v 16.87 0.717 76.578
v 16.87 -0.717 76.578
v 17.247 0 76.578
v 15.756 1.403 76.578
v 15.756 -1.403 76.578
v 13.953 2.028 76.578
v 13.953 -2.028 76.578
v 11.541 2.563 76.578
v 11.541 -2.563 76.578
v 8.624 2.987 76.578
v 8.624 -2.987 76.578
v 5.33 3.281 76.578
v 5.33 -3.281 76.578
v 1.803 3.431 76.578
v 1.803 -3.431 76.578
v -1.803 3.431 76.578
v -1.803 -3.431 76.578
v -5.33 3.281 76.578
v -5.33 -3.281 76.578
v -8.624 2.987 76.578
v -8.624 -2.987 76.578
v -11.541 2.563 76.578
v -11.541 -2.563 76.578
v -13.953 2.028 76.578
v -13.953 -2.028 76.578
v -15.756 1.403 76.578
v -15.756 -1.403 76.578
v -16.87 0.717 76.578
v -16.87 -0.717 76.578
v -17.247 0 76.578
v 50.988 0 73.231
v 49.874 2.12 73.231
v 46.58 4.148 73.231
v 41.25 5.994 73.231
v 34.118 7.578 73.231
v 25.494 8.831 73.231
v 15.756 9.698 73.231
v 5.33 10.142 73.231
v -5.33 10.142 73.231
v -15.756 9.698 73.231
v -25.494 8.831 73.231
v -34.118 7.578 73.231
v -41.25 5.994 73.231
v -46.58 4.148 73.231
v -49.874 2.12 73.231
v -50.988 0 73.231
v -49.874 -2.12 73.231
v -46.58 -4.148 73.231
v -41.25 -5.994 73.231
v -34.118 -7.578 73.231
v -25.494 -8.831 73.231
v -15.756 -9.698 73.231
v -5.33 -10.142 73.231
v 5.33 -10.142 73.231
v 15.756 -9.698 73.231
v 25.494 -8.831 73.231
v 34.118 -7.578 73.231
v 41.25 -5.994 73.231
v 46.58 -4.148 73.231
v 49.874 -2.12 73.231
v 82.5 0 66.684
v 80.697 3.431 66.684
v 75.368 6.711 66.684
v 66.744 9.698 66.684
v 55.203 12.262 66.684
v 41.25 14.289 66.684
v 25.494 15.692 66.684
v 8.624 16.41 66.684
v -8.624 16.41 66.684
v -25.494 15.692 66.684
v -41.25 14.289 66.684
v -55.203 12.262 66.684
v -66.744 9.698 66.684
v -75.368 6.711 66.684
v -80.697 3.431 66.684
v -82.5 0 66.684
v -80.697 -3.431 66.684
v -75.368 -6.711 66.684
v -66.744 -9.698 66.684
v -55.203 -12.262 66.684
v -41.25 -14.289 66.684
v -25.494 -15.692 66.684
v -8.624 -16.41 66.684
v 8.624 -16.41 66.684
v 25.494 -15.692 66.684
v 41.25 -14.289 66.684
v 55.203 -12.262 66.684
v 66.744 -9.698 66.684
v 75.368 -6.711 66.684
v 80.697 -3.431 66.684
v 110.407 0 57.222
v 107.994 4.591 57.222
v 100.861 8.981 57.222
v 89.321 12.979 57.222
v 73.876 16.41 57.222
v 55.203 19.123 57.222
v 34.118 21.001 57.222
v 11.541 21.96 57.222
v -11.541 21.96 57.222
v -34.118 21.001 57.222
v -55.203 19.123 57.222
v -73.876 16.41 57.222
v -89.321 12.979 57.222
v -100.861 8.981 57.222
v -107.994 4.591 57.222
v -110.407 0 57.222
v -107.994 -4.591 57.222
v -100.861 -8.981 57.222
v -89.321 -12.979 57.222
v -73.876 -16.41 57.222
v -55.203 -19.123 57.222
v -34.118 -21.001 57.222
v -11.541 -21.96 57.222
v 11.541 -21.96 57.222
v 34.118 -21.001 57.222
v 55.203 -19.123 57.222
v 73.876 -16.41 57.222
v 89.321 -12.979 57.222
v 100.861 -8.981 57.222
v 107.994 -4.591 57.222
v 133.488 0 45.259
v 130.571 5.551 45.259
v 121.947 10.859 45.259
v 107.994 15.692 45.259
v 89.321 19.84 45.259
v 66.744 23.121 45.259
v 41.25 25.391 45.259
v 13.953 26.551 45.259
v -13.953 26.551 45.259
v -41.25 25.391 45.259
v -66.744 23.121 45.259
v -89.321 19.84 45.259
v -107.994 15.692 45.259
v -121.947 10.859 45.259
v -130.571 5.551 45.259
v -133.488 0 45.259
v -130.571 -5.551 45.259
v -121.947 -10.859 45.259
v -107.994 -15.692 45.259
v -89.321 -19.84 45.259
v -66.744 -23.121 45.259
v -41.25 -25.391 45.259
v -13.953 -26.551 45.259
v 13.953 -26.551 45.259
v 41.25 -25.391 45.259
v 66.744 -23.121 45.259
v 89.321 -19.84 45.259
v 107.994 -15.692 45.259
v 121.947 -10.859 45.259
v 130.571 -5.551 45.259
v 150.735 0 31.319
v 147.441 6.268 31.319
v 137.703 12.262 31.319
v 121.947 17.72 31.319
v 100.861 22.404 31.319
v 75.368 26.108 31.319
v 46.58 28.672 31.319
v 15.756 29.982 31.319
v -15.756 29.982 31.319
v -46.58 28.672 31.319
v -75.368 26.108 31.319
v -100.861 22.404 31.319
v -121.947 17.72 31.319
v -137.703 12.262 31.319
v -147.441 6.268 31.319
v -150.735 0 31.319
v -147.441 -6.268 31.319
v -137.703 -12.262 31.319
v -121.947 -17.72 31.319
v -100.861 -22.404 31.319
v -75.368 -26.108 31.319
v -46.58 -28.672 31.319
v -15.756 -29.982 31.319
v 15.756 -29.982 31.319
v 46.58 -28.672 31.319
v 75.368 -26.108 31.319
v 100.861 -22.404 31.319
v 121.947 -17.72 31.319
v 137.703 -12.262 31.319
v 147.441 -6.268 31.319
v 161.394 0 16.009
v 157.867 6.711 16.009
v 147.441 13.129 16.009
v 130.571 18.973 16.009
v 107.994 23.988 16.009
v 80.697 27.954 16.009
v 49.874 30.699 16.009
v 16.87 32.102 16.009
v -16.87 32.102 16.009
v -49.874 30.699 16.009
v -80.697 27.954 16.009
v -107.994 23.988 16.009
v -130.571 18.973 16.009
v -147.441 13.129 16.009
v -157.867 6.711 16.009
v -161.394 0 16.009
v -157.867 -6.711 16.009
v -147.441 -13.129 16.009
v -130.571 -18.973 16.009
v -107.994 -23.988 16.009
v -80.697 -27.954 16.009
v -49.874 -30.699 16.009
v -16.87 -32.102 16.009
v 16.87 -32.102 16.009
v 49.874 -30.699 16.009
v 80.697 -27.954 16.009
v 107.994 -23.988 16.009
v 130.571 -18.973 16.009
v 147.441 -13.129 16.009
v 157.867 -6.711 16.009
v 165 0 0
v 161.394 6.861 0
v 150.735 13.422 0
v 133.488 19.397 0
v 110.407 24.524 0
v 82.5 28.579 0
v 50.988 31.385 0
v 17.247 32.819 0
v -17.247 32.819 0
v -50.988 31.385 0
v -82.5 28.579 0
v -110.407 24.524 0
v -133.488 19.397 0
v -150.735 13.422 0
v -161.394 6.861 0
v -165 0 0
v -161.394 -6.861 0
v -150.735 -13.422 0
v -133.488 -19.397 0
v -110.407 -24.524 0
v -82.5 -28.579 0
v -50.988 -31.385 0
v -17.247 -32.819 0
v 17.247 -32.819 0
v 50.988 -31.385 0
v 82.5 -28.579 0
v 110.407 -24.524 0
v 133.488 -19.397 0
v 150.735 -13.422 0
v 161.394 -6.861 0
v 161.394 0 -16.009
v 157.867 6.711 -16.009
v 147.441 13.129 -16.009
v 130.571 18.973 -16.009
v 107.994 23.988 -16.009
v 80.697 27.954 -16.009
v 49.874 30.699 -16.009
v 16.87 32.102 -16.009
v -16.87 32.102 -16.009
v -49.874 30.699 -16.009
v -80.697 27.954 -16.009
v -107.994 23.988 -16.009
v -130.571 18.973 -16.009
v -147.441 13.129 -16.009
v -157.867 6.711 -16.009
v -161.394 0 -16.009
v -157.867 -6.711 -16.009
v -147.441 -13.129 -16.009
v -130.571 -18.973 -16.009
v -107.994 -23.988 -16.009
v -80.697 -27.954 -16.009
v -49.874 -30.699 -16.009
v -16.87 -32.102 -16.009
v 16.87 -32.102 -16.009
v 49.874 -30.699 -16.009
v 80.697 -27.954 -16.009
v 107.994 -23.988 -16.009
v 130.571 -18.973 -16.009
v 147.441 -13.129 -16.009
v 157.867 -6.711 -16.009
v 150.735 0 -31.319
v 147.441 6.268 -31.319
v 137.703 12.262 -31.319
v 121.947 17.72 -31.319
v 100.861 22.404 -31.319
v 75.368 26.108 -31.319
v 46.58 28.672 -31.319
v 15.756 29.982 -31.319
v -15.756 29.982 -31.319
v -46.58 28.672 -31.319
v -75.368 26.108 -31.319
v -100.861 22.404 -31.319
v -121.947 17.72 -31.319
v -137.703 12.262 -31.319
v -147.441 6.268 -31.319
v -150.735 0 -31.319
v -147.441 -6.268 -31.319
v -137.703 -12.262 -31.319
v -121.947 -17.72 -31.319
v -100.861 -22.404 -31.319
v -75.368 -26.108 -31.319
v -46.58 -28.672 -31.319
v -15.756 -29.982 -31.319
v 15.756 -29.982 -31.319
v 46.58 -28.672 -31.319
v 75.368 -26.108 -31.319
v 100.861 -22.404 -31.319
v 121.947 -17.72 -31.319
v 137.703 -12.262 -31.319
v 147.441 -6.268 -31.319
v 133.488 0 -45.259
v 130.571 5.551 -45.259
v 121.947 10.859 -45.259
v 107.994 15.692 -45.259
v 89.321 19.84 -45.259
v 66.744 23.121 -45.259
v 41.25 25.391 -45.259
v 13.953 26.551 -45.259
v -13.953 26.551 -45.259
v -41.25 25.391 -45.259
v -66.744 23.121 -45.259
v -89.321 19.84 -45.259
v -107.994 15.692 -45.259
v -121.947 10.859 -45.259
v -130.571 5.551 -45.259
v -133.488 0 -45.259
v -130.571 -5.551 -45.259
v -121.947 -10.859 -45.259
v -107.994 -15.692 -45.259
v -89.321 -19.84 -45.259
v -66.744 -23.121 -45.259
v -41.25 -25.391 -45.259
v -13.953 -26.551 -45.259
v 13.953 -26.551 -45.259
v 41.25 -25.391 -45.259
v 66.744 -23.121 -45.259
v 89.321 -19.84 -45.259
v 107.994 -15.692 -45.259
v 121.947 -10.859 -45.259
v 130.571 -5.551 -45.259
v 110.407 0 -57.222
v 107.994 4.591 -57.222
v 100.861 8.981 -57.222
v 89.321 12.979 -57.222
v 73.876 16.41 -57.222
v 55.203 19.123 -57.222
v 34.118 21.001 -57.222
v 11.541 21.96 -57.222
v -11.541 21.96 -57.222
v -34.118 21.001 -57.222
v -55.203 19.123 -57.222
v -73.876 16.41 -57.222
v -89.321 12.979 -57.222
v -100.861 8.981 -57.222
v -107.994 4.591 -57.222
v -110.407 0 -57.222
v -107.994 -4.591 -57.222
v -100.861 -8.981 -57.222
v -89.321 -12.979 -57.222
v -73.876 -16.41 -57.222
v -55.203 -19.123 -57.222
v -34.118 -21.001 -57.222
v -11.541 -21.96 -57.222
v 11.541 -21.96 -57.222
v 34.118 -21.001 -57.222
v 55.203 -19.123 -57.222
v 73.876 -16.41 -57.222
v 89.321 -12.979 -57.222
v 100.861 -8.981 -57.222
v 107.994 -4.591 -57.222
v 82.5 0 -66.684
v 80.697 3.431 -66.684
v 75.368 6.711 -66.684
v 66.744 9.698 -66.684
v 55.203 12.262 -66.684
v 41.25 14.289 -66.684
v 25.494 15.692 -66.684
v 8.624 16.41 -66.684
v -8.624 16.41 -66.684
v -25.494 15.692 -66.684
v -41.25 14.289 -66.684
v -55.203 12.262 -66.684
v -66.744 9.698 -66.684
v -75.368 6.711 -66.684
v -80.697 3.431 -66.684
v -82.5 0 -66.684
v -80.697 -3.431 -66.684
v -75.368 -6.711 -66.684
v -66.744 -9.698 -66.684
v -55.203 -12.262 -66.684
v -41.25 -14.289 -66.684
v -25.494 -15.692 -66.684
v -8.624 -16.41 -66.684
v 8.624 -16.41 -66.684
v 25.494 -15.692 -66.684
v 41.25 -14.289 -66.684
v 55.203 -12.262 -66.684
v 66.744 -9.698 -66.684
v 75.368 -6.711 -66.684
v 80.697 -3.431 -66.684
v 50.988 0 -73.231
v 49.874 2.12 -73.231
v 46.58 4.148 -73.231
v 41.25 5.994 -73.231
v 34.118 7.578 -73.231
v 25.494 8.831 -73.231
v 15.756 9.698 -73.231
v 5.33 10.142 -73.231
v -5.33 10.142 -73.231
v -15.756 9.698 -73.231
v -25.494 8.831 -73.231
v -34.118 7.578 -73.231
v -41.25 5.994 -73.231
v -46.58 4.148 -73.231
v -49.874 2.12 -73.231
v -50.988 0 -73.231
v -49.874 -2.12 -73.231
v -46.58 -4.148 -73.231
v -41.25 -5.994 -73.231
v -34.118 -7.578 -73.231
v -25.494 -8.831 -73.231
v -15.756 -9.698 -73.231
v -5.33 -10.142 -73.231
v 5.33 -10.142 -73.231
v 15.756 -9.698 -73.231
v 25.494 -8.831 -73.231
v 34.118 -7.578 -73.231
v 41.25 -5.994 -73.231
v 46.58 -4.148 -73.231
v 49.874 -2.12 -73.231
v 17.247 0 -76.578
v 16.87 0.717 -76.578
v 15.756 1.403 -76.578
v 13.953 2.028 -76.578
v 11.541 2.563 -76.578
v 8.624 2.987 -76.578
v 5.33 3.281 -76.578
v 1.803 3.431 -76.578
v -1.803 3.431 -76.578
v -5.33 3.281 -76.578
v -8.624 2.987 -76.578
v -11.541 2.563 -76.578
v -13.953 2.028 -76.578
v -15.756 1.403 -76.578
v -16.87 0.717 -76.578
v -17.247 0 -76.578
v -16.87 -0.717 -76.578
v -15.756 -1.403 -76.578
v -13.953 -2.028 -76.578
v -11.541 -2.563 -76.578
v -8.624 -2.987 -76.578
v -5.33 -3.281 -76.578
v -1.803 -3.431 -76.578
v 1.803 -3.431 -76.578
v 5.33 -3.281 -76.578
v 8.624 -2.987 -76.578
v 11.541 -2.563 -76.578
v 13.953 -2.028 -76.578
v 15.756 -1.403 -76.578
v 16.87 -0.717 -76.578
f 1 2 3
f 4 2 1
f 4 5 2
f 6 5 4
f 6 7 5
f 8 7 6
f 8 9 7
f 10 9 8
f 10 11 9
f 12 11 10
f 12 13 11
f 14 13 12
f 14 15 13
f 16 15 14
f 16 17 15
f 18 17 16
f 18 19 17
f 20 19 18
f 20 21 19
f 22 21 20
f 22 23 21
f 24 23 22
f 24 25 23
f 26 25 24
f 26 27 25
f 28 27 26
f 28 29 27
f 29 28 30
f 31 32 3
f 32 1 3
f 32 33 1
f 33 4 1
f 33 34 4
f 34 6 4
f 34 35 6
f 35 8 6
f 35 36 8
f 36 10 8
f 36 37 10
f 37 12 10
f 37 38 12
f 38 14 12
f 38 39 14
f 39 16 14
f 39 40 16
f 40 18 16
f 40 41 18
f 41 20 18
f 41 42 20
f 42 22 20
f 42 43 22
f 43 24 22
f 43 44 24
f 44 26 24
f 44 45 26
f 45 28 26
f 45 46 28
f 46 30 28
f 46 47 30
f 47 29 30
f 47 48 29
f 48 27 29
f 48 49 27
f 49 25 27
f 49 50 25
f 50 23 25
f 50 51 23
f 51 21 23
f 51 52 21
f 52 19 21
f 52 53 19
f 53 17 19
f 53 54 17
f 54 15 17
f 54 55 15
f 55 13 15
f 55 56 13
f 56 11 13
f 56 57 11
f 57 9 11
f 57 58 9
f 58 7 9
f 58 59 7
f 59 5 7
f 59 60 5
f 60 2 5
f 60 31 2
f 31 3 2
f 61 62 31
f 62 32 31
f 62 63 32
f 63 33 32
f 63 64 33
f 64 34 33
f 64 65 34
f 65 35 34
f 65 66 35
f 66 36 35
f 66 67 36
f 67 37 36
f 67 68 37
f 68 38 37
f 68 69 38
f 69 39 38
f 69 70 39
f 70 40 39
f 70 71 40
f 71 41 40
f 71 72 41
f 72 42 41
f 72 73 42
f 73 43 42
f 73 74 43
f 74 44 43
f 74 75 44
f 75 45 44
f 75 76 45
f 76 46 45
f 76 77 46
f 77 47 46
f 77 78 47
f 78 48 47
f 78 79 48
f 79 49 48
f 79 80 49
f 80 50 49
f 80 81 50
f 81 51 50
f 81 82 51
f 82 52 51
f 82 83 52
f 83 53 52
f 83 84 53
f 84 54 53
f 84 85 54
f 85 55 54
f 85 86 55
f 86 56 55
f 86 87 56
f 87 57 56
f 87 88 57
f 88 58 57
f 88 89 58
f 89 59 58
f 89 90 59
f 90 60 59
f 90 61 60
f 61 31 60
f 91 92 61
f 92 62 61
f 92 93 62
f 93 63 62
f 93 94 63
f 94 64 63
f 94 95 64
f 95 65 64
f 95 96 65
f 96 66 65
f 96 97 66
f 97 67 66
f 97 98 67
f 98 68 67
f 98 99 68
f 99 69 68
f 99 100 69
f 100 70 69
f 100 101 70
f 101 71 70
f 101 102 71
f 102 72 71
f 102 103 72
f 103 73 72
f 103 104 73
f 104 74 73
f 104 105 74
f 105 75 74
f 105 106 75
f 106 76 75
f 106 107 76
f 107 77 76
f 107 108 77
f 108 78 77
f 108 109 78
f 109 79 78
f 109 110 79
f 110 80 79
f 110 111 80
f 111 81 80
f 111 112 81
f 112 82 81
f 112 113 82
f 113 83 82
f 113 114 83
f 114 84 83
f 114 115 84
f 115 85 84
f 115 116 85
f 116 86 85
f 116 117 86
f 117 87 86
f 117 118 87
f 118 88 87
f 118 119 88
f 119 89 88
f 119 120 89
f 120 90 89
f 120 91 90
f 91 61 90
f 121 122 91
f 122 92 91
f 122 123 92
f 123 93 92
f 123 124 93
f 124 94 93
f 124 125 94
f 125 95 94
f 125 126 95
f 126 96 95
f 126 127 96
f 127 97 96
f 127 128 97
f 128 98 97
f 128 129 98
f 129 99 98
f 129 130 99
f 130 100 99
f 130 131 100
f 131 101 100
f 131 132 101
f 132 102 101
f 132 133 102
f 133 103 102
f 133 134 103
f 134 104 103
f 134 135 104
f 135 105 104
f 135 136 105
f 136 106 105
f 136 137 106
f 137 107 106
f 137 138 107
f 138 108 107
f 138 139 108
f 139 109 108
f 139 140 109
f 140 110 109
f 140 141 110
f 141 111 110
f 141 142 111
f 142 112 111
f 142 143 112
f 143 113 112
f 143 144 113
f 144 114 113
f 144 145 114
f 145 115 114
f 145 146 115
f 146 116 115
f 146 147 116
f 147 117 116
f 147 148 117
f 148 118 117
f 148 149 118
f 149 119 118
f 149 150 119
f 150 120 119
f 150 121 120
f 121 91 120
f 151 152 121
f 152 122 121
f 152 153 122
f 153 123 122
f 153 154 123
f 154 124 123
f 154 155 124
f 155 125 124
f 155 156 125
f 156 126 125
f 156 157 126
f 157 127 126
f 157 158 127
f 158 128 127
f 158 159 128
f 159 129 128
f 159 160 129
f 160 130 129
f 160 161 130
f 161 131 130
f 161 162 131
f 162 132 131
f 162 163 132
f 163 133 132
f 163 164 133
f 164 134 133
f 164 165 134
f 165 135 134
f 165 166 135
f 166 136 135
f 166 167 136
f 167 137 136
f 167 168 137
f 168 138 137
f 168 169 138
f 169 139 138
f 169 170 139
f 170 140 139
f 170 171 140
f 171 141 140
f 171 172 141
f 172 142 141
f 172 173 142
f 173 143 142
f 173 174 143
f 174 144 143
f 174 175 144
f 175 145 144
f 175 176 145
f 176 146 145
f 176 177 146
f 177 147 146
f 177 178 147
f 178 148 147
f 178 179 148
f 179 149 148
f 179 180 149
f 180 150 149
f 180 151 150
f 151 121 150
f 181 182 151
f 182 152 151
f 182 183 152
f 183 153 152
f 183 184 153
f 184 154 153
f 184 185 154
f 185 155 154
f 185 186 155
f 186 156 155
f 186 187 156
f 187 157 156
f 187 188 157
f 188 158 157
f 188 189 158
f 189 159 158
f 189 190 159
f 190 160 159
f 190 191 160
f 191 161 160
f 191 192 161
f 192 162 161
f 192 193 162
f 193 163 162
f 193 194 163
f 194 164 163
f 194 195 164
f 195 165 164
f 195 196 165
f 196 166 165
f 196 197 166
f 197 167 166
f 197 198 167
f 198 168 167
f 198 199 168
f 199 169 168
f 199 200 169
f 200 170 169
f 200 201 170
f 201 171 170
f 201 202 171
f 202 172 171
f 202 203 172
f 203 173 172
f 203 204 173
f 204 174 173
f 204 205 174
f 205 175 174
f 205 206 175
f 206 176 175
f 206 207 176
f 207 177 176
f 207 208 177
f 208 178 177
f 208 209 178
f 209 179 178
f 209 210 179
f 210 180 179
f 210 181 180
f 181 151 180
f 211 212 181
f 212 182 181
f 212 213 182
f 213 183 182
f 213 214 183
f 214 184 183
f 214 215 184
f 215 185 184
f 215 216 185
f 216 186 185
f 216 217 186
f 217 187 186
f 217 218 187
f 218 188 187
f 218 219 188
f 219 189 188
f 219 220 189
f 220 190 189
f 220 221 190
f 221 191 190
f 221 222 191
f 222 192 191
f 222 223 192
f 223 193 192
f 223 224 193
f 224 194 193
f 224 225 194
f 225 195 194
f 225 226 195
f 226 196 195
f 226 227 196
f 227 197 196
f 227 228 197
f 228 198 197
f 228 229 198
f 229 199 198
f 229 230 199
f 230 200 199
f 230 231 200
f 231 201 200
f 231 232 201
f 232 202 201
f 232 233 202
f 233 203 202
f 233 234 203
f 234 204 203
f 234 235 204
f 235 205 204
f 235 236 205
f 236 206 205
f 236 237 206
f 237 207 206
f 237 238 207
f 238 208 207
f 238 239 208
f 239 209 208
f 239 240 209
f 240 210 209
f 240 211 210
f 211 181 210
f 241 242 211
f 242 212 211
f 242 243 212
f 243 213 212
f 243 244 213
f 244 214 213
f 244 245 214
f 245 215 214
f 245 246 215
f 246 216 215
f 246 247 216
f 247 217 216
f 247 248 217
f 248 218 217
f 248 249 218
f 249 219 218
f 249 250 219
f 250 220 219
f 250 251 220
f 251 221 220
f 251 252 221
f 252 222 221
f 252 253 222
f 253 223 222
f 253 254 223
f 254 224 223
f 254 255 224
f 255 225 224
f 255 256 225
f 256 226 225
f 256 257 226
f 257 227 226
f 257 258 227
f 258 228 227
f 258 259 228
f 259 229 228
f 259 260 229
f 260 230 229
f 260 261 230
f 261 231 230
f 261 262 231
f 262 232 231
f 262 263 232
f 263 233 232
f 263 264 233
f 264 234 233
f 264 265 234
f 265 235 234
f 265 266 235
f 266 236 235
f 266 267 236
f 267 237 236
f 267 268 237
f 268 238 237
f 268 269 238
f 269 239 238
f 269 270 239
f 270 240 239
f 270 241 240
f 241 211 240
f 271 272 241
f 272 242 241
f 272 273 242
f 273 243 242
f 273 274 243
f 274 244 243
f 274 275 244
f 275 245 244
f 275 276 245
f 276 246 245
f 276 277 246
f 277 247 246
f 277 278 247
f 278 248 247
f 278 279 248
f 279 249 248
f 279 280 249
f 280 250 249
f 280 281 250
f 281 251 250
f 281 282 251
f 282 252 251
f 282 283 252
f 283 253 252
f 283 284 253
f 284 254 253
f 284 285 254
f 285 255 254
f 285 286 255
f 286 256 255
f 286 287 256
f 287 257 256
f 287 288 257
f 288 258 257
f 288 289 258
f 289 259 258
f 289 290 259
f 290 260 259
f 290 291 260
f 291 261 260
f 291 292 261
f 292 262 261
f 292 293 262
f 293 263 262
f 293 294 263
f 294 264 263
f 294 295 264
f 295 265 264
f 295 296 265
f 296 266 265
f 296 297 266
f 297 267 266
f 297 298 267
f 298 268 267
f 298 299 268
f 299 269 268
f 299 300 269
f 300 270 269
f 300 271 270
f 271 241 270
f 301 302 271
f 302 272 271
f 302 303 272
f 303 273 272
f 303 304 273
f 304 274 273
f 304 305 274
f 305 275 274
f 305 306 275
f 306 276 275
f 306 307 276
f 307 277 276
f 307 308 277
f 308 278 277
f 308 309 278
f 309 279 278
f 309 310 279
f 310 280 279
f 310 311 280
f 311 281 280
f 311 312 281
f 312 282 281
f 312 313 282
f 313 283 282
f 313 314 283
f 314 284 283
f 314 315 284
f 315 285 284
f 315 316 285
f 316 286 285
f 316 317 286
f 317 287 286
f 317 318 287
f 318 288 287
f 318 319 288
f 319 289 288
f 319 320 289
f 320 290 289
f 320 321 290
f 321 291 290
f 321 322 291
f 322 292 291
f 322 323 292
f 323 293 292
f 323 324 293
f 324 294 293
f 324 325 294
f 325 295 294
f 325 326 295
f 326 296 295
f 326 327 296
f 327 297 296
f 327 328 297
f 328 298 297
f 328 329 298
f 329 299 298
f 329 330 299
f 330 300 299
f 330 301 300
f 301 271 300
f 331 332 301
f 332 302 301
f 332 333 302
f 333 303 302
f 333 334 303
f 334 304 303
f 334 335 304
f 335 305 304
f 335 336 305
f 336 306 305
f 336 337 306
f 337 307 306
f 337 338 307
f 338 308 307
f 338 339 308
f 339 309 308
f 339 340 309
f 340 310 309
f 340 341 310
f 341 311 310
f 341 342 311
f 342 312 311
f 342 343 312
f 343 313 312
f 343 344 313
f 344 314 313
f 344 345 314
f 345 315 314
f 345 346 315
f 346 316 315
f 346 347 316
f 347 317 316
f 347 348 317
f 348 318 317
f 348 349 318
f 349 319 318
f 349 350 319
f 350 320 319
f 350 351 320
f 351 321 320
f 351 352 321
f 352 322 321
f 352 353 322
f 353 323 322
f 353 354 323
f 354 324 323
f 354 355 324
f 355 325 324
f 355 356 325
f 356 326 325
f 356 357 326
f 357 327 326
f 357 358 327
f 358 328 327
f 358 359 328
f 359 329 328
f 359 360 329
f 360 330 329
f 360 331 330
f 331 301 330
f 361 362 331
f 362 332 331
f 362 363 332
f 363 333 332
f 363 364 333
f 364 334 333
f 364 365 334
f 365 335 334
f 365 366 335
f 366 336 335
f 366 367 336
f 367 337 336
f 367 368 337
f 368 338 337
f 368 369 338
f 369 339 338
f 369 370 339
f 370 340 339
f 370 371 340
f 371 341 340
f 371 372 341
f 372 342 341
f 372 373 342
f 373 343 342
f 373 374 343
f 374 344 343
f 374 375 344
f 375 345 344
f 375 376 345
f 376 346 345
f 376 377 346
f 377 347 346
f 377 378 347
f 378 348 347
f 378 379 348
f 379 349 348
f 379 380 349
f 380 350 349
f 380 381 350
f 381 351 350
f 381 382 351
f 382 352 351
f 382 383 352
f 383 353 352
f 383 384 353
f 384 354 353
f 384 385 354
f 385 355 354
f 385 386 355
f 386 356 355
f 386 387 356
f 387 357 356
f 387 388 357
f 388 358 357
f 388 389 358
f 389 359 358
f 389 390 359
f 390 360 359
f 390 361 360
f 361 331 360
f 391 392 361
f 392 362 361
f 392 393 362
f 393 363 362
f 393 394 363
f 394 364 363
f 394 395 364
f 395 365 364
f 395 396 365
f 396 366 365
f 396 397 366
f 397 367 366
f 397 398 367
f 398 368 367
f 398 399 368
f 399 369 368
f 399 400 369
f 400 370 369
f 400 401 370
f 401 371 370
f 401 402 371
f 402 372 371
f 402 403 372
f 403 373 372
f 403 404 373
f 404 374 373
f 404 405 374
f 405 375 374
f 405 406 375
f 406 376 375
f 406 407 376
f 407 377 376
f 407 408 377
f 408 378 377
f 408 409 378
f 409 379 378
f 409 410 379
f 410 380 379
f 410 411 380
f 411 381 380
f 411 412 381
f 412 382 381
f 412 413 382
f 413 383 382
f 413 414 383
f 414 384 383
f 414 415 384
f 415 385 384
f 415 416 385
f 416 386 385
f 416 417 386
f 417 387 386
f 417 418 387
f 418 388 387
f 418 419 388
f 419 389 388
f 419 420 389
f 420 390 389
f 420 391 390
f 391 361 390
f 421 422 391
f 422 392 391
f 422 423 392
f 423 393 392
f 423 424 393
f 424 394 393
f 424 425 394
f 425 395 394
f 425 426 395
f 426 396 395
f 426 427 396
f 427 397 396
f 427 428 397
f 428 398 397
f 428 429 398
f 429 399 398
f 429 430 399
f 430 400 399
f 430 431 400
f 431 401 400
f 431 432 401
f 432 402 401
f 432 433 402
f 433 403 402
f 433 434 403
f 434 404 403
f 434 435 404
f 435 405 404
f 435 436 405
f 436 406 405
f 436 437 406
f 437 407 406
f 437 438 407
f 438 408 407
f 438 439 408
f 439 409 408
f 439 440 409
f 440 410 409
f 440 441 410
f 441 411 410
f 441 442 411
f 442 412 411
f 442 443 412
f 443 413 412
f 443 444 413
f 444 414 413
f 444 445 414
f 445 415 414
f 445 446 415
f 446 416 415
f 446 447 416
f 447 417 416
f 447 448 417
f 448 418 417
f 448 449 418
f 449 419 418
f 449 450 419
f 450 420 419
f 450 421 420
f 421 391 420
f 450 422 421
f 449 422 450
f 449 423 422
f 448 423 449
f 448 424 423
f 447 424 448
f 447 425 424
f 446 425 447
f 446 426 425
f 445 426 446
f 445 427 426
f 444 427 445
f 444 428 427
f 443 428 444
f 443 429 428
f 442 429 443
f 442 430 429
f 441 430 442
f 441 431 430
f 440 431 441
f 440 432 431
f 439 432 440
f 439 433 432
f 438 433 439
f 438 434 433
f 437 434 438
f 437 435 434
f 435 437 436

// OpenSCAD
// Generated by SolidPython 1.0.1 on 2020-07-29 00:46:51


scale(v = [15, 3, 7]) {
	sphere(r = 11);
}
/***********************************************
*********      SolidPython code:      **********
************************************************
 
# import packages: SolidPython
from solid import *
from solid.utils import *
from itertools import chain, combinations, permutations


class Resize:

    def __init__(self, scad_file):
        self.scad_file = scad_file
        #self.scad_file = import_scad(scad_file)
        # cone/cylinder param:
        self.r1 = 0
        self.r2 = 0
        self.h = 0
        # rectangular prism param:
        self.w = 0
        self.l = 0
        # ellipse param:
        self.r = 0

    # import OpenScad code (file name corresponds to shape)


    # classify shape + parameters
    def assign(self, param1, param2, param3):
        if self.scad_file == 'cone.scad':
            self.r1 = param1
            self.r2 = param2
            self.h = param3
        elif self.scad_file == 'cylinder.scad':
            self.r1 = param1
            self.r2 = param2
            self.h = param3
        elif self.scad_file == 'rectangularPrism.scad':
            self.h = param1
            self.l = param2
            self.w = param3
        else:
            self.r = param1
            self.h = param2

    # resize parameters
    def iterate(self):
        x = range(3, 20, 2)
        i = 1
        if self.scad_file == 'cone.scad':
            tempList = list(permutations(x, 2))
            for temp in tempList:
                param1 = temp[0]
                param2 = temp[1]
                filepath = 'produced_scad_files/' + 'cone' + str(param1) + '_' + str(param2) + '_' + '.scad'
                scad_render_to_file(cylinder(h=param1, r1=param2, r2=0), filepath)

        elif self.scad_file == 'cylinder.scad':
            tempList = list(permutations(x, 3))
            for temp in tempList:
                param1 = temp[0]
                param2 = temp[1]
                filepath = 'produced_scad_files/' + 'cylinder' + str(param1) + '_' + str(param2) + '_' + '.scad'
                scad_render_to_file(cylinder(h=param1, r1=param2, r2=param2), filepath)

        elif self.scad_file == 'rectangularPrism.scad':
            tempList = list(permutations(x, 3))
            for temp in tempList:
                param1 = temp[0]
                param2 = temp[1]
                param3 = temp[2]
                filepath = 'produced_scad_files/' + 'rectangularPrism' + str(param1) + '_' + str(param2) + '_' + str(
                    param3) + '.scad'
                scad_render_to_file(cube(size=(param1, param2, param3)), filepath)

        elif self.scad_file == 'ellipse.scad':
            tempList = list(permutations(x, 4))
            for temp in tempList:
                param1 = temp[0]
                param2 = temp[1]
                param3 = temp[2]
                param4 = temp[3]
                filepath = 'produced_scad_files/' + 'ellipse' + str(param1) + '_' + str(param2) + '_' + str(param3) + '_' + str(param4) + '.scad'
                scad_render_to_file(scale([param1, param2, param3])(sphere(r=param4)), filepath)

    def render_to_scadfile(self):
        scad_render_to_file(scad, 'example.scad') 
 
************************************************/
